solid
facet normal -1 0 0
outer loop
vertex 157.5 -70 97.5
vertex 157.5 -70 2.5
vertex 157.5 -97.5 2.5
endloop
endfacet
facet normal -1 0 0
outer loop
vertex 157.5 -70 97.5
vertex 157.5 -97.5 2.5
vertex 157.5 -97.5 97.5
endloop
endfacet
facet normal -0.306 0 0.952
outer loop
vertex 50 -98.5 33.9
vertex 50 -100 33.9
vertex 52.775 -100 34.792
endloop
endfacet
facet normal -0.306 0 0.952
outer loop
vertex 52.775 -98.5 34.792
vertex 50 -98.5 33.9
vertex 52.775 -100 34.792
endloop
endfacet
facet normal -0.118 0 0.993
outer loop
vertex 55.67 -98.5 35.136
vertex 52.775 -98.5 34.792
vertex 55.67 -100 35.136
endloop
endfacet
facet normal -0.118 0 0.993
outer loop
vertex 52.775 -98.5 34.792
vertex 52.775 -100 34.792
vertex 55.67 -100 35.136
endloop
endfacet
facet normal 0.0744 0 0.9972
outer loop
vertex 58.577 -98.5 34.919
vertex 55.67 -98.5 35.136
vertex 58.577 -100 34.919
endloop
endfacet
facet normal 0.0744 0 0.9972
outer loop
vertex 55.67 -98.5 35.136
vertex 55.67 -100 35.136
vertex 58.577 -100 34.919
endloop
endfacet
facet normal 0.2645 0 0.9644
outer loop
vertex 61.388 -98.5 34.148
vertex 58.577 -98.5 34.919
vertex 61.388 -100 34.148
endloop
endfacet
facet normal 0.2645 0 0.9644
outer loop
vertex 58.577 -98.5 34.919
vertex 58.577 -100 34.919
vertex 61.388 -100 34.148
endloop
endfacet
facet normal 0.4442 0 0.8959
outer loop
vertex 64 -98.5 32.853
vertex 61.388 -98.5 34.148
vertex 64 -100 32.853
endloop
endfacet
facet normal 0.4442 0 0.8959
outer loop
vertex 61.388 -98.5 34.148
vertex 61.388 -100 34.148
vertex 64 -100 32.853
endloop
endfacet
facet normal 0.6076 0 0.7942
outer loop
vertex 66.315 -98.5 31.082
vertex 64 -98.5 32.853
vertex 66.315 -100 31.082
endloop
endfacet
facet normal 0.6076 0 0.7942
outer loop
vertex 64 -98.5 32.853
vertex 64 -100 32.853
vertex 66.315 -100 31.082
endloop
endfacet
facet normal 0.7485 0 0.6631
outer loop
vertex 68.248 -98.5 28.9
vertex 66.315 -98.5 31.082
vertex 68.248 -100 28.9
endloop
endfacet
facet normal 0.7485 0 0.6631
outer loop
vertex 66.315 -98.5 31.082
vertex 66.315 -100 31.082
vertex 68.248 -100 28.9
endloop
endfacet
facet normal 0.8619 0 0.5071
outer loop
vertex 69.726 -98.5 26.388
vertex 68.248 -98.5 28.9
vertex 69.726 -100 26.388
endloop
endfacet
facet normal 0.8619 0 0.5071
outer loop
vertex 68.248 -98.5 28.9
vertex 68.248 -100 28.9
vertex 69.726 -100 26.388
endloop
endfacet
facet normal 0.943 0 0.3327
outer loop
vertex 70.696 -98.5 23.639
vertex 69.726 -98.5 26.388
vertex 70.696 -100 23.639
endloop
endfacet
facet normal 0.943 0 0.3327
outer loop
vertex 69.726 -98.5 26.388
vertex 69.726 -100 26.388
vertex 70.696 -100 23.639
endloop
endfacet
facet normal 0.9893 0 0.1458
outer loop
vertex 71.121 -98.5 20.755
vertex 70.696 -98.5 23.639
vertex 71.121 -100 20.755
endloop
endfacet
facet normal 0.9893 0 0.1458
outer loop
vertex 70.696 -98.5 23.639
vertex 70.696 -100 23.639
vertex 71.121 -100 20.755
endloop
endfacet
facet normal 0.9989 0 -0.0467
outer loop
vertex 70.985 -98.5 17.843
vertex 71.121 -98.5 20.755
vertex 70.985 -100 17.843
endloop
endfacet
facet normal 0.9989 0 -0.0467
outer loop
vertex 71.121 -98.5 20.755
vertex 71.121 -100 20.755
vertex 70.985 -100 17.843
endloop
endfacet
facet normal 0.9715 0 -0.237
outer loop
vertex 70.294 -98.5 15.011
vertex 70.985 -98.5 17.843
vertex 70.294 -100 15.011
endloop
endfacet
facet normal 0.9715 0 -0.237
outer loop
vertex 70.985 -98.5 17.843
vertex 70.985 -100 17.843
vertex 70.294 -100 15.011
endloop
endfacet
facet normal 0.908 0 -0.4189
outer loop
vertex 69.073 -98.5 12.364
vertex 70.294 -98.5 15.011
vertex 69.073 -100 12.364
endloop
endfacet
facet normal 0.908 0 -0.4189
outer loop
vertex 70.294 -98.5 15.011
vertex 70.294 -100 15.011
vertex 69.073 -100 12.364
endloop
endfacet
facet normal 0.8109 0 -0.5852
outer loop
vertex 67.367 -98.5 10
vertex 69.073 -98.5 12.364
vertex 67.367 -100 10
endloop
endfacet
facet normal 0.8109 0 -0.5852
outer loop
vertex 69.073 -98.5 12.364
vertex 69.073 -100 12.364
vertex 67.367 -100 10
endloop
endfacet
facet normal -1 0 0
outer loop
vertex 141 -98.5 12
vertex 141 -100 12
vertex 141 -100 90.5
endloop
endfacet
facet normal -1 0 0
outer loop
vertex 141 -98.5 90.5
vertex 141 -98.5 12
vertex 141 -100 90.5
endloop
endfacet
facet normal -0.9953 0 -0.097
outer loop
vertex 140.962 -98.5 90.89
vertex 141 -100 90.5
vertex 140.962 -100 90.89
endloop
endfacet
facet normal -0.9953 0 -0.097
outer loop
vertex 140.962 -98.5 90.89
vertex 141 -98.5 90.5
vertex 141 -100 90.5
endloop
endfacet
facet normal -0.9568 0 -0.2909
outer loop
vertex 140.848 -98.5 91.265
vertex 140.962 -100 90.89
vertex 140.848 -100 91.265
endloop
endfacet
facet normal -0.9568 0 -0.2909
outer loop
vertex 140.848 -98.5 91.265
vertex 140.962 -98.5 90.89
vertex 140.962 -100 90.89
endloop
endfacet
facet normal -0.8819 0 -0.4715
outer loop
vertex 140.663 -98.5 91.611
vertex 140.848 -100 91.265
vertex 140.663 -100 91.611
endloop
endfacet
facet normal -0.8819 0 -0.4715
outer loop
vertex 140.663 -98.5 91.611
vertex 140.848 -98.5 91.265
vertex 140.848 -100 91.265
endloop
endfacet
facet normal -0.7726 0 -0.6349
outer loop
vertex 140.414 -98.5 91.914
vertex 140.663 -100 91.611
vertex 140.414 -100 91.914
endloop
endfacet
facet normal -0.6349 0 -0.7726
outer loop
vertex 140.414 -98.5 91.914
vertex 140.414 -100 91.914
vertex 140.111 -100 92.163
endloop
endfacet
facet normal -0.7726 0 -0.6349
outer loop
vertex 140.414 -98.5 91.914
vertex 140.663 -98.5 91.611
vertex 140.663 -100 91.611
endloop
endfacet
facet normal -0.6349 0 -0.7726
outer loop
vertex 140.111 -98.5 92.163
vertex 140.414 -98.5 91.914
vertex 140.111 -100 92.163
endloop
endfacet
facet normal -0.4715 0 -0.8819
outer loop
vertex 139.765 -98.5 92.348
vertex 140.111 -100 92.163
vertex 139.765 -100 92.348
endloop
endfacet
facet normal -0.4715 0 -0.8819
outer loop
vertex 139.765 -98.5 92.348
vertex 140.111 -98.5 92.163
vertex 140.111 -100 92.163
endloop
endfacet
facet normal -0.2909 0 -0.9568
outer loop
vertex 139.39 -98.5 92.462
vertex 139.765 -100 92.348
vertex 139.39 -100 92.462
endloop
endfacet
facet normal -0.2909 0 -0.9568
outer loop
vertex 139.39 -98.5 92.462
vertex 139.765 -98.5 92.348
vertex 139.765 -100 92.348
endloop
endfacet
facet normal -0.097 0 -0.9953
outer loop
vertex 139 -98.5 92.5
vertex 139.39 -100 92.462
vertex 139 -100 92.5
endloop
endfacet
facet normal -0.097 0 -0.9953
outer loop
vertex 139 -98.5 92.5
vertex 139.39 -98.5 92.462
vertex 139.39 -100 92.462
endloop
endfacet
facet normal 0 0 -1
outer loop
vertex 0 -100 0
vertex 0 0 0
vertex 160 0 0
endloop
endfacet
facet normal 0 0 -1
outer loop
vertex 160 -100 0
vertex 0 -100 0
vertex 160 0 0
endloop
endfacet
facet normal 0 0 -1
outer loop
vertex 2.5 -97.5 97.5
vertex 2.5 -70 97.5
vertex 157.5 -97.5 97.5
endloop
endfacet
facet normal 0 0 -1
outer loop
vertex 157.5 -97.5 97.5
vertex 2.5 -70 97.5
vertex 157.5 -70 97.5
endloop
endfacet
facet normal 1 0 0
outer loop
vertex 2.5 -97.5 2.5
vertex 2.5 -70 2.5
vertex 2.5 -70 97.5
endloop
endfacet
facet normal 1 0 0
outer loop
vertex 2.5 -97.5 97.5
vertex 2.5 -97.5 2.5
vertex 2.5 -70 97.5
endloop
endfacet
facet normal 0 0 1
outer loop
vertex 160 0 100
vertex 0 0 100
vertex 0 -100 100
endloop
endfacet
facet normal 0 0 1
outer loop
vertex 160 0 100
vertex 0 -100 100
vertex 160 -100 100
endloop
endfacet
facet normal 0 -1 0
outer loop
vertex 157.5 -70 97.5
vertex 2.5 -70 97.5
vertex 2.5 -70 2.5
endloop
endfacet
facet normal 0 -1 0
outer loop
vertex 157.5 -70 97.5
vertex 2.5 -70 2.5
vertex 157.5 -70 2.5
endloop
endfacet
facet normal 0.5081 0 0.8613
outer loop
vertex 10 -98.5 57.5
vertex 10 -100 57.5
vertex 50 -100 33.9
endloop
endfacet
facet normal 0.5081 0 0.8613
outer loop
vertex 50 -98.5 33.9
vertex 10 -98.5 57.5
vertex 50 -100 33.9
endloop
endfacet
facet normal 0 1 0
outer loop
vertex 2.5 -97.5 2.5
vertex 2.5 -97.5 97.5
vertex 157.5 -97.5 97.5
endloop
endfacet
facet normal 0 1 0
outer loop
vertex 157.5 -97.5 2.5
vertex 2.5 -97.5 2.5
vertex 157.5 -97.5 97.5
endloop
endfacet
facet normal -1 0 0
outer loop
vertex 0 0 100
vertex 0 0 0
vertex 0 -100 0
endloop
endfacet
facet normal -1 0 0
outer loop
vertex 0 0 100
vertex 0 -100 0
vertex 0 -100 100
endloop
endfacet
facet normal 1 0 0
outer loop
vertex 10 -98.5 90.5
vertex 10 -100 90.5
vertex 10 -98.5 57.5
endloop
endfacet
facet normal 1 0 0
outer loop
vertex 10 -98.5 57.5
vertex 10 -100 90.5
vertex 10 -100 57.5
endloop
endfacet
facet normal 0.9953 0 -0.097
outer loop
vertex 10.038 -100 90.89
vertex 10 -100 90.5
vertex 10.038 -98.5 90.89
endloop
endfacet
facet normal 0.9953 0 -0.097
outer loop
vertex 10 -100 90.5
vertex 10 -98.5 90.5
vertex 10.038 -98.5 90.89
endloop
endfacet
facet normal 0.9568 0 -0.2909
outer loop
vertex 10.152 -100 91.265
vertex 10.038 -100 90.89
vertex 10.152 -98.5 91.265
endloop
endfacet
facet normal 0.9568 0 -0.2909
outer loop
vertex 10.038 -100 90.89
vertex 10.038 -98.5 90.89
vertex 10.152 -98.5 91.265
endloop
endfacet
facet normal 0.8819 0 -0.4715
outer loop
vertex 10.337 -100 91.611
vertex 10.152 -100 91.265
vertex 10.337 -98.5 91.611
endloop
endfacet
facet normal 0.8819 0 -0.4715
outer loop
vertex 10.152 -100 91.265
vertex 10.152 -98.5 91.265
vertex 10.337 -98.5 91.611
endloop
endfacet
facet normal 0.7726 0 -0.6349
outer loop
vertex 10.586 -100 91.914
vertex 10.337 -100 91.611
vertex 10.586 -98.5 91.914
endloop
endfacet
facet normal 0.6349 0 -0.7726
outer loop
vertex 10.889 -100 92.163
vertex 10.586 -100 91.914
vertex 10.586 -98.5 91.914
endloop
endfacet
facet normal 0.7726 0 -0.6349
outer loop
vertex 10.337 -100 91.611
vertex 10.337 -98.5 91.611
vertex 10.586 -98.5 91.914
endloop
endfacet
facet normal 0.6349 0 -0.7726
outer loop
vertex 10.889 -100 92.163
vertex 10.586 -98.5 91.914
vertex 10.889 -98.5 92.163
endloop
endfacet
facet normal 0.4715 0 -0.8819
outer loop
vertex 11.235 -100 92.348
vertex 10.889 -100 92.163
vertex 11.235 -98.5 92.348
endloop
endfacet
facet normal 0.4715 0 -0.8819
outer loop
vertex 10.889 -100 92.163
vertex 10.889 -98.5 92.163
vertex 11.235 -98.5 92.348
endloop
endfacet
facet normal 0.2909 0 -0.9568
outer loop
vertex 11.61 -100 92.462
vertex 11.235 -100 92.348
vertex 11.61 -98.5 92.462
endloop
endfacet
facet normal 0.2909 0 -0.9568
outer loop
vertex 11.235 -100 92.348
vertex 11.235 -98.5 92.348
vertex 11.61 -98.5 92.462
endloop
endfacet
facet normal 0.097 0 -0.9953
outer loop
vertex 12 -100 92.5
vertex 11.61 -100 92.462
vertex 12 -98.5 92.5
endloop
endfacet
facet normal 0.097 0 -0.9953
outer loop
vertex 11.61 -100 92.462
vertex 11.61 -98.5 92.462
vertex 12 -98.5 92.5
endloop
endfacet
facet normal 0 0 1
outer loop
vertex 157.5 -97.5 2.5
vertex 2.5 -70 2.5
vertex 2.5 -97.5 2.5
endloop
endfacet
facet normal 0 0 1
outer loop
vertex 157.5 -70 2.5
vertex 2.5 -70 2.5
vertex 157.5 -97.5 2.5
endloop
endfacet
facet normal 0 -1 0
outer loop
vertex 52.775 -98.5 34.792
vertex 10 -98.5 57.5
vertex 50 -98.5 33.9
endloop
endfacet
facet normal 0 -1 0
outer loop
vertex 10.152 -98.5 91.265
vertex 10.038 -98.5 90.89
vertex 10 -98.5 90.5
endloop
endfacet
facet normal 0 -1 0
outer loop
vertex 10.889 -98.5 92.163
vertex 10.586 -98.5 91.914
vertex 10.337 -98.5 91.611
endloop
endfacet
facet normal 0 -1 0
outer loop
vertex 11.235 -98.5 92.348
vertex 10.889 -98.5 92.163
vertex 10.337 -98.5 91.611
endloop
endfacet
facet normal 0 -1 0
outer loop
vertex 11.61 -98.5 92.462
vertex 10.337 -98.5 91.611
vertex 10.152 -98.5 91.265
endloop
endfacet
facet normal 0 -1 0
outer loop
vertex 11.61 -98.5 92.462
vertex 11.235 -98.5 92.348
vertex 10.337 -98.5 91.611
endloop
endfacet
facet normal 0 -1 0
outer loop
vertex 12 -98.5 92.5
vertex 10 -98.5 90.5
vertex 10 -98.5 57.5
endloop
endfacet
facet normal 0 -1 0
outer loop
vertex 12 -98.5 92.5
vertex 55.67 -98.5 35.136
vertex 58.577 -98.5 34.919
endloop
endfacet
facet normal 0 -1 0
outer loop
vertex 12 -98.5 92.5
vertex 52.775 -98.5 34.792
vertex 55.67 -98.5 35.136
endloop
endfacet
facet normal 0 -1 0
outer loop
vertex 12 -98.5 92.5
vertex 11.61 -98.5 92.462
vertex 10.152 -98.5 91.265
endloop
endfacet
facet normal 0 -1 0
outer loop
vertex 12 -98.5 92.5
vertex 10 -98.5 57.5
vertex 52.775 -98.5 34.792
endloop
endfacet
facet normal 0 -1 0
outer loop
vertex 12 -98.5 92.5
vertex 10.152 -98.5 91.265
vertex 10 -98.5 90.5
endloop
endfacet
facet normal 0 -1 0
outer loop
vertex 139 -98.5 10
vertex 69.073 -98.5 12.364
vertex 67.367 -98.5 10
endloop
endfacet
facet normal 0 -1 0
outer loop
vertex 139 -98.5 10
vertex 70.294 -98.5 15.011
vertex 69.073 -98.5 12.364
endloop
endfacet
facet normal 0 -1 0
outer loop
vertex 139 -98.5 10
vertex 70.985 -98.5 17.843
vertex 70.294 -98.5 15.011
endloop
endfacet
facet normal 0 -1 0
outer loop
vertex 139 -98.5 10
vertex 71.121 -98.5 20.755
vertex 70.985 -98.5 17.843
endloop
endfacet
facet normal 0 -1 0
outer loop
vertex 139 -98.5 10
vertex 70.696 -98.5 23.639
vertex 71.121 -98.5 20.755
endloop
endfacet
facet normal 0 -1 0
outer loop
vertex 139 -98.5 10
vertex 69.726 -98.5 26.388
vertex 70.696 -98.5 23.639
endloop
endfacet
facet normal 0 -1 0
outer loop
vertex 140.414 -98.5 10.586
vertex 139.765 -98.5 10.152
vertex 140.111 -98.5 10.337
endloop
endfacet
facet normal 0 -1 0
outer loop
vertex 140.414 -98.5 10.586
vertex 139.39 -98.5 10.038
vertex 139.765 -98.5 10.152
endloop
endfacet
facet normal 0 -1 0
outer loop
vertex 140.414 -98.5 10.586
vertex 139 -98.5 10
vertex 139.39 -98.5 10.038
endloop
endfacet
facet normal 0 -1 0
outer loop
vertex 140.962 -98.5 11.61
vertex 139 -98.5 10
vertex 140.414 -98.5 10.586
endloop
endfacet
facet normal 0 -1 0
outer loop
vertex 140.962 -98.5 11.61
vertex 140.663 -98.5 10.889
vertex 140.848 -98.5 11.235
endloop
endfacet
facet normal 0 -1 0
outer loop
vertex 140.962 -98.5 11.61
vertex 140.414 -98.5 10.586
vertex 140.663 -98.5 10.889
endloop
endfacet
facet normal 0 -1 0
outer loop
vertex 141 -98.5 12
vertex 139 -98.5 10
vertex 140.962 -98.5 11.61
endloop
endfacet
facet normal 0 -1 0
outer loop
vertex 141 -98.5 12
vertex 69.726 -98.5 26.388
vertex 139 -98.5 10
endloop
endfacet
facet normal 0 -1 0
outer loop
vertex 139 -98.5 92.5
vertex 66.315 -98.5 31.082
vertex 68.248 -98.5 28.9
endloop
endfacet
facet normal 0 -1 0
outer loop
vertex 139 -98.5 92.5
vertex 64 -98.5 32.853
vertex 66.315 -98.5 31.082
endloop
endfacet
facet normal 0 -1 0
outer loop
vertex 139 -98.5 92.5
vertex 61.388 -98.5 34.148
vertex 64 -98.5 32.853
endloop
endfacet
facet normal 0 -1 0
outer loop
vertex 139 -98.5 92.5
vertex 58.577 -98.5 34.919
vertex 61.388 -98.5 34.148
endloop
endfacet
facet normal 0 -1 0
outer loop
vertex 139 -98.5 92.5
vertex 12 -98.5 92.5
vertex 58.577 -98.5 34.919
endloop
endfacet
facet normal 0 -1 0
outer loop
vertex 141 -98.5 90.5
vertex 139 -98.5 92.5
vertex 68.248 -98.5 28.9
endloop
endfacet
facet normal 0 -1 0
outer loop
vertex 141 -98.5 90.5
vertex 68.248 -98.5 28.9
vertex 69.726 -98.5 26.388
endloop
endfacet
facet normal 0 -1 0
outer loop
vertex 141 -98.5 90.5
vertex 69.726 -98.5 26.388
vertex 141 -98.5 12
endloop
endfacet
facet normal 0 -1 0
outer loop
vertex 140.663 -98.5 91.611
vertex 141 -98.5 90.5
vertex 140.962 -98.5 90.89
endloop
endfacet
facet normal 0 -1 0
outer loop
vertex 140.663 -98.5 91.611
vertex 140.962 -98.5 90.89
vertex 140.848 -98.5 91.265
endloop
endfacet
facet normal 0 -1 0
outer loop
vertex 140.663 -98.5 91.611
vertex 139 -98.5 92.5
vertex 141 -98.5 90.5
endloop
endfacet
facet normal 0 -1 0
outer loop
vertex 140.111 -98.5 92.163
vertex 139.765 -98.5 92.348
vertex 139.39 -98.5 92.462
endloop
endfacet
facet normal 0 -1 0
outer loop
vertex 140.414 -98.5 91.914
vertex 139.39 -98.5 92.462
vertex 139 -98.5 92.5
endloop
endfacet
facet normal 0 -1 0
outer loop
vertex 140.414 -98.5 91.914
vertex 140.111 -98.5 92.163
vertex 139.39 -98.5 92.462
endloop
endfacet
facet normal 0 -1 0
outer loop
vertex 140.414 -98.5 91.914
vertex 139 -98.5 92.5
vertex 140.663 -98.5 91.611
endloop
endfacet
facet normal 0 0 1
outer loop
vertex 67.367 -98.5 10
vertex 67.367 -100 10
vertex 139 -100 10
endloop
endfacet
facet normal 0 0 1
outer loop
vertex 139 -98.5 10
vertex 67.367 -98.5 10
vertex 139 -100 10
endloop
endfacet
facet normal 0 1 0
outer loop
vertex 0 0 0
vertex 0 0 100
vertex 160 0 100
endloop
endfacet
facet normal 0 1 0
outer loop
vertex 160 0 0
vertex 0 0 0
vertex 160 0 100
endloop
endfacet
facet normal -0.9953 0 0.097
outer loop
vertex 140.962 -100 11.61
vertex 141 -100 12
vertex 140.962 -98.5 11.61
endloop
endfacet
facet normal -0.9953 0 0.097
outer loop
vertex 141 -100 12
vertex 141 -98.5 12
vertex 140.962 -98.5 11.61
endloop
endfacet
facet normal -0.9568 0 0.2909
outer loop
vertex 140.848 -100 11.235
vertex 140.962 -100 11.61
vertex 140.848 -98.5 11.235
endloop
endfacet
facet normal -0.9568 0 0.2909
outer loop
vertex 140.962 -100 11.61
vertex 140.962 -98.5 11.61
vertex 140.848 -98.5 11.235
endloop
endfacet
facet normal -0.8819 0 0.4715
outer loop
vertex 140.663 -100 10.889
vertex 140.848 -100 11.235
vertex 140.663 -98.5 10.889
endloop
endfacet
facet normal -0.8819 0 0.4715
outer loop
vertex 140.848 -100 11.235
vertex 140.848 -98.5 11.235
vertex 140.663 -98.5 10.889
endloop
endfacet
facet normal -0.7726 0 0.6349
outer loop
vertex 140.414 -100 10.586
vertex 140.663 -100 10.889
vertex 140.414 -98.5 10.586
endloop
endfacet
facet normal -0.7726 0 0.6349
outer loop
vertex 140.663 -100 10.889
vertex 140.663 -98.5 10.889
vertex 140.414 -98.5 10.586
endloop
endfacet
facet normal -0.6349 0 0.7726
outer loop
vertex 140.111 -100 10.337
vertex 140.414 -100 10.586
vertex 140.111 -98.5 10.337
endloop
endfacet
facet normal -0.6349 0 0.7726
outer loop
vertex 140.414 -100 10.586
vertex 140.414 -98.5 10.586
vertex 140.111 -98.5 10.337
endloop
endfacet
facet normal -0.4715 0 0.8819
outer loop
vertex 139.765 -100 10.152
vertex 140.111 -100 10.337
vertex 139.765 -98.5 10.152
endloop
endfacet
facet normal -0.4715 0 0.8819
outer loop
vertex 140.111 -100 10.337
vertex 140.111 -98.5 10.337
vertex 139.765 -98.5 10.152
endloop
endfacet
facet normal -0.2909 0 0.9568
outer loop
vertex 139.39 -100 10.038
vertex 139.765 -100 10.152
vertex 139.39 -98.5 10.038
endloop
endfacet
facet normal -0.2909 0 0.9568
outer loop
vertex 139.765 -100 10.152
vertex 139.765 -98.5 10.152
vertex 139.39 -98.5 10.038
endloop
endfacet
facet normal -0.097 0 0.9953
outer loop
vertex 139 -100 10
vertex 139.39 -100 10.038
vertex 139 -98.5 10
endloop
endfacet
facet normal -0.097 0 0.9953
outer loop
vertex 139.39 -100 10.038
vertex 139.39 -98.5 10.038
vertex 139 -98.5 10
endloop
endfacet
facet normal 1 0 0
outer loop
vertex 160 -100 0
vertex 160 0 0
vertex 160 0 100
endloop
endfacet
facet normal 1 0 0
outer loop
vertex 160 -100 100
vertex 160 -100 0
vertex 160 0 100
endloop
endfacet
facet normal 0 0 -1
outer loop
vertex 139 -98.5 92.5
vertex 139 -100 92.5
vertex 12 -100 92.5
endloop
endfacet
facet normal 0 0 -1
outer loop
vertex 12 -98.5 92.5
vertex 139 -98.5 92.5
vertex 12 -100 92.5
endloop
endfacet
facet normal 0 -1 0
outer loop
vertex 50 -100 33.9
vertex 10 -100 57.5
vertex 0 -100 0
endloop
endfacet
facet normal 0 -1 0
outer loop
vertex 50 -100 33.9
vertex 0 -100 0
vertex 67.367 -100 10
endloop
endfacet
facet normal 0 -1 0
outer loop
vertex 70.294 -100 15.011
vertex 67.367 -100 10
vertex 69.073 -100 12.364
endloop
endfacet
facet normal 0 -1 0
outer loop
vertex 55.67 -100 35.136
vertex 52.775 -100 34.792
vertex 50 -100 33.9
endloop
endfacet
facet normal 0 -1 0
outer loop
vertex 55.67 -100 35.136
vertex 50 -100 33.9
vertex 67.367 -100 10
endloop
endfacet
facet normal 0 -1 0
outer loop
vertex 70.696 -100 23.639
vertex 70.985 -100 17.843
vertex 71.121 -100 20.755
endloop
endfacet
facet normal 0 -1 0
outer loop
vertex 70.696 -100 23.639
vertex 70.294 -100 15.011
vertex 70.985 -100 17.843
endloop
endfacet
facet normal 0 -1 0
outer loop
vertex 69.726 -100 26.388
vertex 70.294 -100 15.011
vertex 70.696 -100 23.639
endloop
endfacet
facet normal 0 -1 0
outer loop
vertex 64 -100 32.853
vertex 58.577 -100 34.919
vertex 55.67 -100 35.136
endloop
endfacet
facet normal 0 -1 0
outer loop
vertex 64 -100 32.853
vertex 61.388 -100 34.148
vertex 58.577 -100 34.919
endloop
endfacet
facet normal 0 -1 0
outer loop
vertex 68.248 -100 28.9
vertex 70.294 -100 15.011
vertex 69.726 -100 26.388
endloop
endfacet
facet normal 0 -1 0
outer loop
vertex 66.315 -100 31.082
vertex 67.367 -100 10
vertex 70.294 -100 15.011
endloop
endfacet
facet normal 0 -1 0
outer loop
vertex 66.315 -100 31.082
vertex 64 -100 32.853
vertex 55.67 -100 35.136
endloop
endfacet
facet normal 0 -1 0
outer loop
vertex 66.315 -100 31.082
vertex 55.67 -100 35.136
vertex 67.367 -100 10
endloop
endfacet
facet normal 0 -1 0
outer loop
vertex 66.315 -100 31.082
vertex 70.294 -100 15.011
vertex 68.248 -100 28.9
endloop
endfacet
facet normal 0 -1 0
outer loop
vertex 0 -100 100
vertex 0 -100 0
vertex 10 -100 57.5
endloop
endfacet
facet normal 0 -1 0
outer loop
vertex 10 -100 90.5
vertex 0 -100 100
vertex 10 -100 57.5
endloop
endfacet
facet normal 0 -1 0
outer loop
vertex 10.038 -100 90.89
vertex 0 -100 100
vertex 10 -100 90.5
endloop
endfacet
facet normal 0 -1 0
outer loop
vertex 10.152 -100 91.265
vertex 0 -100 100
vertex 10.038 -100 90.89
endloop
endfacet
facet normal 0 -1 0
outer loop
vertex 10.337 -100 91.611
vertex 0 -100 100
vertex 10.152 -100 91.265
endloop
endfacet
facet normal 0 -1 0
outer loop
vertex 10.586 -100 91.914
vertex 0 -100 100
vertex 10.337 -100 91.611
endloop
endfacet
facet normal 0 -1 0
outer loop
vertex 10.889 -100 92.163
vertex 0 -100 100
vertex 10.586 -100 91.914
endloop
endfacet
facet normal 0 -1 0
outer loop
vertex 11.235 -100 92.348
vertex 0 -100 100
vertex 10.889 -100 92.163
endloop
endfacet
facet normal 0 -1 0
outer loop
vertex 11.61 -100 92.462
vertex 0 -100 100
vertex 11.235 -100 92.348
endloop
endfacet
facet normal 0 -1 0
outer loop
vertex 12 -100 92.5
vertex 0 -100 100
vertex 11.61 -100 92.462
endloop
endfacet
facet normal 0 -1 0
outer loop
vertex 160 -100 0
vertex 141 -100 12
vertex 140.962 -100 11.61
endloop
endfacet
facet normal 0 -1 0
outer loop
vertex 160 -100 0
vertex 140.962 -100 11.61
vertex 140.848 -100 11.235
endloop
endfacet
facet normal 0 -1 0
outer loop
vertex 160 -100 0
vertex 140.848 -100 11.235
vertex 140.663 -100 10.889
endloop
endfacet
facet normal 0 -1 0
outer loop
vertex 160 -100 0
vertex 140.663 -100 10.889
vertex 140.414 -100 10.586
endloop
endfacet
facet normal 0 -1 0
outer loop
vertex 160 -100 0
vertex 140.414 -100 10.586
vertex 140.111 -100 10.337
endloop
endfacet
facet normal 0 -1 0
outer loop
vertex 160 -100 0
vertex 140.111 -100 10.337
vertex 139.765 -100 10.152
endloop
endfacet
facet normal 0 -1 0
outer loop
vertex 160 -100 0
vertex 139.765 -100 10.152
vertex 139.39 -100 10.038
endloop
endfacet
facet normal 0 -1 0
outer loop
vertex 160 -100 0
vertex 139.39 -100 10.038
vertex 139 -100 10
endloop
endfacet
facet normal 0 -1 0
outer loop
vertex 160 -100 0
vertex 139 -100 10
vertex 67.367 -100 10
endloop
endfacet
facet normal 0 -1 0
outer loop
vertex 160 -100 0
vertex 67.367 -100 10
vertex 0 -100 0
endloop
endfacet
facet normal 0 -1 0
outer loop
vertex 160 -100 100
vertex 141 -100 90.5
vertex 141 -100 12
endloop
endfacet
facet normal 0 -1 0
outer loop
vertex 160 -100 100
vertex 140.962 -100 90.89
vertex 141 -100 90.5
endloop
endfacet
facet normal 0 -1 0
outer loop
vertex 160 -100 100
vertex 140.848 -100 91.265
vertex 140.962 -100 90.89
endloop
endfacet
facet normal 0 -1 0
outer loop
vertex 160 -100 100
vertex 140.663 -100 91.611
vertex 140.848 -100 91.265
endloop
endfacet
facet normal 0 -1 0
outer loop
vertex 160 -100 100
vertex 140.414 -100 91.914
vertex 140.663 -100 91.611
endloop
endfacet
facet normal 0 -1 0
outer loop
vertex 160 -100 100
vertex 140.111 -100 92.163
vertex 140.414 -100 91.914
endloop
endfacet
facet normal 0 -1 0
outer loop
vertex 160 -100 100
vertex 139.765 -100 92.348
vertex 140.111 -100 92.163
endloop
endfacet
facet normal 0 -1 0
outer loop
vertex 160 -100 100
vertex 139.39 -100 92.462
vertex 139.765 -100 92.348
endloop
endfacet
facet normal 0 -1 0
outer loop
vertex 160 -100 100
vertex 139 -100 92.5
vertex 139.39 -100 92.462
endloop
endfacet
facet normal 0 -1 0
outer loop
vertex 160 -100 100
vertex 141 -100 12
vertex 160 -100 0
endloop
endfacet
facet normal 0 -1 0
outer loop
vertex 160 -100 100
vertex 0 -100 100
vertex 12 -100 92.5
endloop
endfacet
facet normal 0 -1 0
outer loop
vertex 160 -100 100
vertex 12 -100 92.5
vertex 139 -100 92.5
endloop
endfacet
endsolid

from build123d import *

# Parameters (mm, degrees)
F0_W     = 160
F0_H     = 100
F1_DEPTH = 100
F3_DEPTH = 50
F4_T     = -2.5
F5_W     = 155
F5_H     = 95
F6_DEPTH = 67.5
F8_W     = 150
F8_H     = 90
F9_DEPTH = 1
F10_R    = 2


with BuildPart() as f1:
    # F0 (on Front) → F1 (new body)
    with BuildSketch(Plane.XZ):
        with Locations((80, 50)):
            Rectangle(F0_W, F0_H)
    extrude(amount=F1_DEPTH)

    # F2 (on face) → F3 (cut)
    with BuildSketch(Plane.XZ.offset(100)):
        with BuildLine():
            Line((141, 10), (141, 50))
            Line((141, 50), (141, 92.5))
            Line((141, 92.5), (10, 92.5))
            Line((10, 92.5), (10, 57.5))
            Line((10, 57.5), (50, 33.9))
            ThreePointArc((50, 33.9), (68.2476049495, 28.8997849974), (67.3670576668, 10))
            Line((67.3670576668, 10), (80, 10))
            Line((80, 10), (141, 10))
        make_face()
    extrude(amount=-F3_DEPTH, mode=Mode.SUBTRACT)

    # F4
    f4_openings = [f1.faces().sort_by_distance(p)[0] for p in [
        (10, -75, 75),
        (30, -75, 45.7),
        (68.247605, -75, 28.899785),
        (104.183529, -75, 10),
        (141, -75, 51.25),
        (83.977871, -50, 56.442025),
        (75.5, -75, 92.5),
    ]]
    offset(amount=F4_T, openings=f4_openings)

    # F5 (on face) → F6 (join)
    with BuildSketch(Plane.XZ.offset(2.5)):
        with Locations((80, 50)):
            Rectangle(F5_W, F5_H)
    extrude(amount=F6_DEPTH)

    # F8 (on offset) → F9 (join)
    with BuildSketch(Plane.XZ.offset(97.5)):
        with Locations((80, 50)):
            Rectangle(F8_W, F8_H)
    extrude(amount=F9_DEPTH)

    # F10
    f10_edges = [f1.edges().sort_by_distance(p)[0] for p in [
        (10, -99.25, 92.5),
        (141, -99.25, 92.5),
        (141, -99.25, 10),
    ]]
    fillet(f10_edges, radius=F10_R)


solid = f1.part
